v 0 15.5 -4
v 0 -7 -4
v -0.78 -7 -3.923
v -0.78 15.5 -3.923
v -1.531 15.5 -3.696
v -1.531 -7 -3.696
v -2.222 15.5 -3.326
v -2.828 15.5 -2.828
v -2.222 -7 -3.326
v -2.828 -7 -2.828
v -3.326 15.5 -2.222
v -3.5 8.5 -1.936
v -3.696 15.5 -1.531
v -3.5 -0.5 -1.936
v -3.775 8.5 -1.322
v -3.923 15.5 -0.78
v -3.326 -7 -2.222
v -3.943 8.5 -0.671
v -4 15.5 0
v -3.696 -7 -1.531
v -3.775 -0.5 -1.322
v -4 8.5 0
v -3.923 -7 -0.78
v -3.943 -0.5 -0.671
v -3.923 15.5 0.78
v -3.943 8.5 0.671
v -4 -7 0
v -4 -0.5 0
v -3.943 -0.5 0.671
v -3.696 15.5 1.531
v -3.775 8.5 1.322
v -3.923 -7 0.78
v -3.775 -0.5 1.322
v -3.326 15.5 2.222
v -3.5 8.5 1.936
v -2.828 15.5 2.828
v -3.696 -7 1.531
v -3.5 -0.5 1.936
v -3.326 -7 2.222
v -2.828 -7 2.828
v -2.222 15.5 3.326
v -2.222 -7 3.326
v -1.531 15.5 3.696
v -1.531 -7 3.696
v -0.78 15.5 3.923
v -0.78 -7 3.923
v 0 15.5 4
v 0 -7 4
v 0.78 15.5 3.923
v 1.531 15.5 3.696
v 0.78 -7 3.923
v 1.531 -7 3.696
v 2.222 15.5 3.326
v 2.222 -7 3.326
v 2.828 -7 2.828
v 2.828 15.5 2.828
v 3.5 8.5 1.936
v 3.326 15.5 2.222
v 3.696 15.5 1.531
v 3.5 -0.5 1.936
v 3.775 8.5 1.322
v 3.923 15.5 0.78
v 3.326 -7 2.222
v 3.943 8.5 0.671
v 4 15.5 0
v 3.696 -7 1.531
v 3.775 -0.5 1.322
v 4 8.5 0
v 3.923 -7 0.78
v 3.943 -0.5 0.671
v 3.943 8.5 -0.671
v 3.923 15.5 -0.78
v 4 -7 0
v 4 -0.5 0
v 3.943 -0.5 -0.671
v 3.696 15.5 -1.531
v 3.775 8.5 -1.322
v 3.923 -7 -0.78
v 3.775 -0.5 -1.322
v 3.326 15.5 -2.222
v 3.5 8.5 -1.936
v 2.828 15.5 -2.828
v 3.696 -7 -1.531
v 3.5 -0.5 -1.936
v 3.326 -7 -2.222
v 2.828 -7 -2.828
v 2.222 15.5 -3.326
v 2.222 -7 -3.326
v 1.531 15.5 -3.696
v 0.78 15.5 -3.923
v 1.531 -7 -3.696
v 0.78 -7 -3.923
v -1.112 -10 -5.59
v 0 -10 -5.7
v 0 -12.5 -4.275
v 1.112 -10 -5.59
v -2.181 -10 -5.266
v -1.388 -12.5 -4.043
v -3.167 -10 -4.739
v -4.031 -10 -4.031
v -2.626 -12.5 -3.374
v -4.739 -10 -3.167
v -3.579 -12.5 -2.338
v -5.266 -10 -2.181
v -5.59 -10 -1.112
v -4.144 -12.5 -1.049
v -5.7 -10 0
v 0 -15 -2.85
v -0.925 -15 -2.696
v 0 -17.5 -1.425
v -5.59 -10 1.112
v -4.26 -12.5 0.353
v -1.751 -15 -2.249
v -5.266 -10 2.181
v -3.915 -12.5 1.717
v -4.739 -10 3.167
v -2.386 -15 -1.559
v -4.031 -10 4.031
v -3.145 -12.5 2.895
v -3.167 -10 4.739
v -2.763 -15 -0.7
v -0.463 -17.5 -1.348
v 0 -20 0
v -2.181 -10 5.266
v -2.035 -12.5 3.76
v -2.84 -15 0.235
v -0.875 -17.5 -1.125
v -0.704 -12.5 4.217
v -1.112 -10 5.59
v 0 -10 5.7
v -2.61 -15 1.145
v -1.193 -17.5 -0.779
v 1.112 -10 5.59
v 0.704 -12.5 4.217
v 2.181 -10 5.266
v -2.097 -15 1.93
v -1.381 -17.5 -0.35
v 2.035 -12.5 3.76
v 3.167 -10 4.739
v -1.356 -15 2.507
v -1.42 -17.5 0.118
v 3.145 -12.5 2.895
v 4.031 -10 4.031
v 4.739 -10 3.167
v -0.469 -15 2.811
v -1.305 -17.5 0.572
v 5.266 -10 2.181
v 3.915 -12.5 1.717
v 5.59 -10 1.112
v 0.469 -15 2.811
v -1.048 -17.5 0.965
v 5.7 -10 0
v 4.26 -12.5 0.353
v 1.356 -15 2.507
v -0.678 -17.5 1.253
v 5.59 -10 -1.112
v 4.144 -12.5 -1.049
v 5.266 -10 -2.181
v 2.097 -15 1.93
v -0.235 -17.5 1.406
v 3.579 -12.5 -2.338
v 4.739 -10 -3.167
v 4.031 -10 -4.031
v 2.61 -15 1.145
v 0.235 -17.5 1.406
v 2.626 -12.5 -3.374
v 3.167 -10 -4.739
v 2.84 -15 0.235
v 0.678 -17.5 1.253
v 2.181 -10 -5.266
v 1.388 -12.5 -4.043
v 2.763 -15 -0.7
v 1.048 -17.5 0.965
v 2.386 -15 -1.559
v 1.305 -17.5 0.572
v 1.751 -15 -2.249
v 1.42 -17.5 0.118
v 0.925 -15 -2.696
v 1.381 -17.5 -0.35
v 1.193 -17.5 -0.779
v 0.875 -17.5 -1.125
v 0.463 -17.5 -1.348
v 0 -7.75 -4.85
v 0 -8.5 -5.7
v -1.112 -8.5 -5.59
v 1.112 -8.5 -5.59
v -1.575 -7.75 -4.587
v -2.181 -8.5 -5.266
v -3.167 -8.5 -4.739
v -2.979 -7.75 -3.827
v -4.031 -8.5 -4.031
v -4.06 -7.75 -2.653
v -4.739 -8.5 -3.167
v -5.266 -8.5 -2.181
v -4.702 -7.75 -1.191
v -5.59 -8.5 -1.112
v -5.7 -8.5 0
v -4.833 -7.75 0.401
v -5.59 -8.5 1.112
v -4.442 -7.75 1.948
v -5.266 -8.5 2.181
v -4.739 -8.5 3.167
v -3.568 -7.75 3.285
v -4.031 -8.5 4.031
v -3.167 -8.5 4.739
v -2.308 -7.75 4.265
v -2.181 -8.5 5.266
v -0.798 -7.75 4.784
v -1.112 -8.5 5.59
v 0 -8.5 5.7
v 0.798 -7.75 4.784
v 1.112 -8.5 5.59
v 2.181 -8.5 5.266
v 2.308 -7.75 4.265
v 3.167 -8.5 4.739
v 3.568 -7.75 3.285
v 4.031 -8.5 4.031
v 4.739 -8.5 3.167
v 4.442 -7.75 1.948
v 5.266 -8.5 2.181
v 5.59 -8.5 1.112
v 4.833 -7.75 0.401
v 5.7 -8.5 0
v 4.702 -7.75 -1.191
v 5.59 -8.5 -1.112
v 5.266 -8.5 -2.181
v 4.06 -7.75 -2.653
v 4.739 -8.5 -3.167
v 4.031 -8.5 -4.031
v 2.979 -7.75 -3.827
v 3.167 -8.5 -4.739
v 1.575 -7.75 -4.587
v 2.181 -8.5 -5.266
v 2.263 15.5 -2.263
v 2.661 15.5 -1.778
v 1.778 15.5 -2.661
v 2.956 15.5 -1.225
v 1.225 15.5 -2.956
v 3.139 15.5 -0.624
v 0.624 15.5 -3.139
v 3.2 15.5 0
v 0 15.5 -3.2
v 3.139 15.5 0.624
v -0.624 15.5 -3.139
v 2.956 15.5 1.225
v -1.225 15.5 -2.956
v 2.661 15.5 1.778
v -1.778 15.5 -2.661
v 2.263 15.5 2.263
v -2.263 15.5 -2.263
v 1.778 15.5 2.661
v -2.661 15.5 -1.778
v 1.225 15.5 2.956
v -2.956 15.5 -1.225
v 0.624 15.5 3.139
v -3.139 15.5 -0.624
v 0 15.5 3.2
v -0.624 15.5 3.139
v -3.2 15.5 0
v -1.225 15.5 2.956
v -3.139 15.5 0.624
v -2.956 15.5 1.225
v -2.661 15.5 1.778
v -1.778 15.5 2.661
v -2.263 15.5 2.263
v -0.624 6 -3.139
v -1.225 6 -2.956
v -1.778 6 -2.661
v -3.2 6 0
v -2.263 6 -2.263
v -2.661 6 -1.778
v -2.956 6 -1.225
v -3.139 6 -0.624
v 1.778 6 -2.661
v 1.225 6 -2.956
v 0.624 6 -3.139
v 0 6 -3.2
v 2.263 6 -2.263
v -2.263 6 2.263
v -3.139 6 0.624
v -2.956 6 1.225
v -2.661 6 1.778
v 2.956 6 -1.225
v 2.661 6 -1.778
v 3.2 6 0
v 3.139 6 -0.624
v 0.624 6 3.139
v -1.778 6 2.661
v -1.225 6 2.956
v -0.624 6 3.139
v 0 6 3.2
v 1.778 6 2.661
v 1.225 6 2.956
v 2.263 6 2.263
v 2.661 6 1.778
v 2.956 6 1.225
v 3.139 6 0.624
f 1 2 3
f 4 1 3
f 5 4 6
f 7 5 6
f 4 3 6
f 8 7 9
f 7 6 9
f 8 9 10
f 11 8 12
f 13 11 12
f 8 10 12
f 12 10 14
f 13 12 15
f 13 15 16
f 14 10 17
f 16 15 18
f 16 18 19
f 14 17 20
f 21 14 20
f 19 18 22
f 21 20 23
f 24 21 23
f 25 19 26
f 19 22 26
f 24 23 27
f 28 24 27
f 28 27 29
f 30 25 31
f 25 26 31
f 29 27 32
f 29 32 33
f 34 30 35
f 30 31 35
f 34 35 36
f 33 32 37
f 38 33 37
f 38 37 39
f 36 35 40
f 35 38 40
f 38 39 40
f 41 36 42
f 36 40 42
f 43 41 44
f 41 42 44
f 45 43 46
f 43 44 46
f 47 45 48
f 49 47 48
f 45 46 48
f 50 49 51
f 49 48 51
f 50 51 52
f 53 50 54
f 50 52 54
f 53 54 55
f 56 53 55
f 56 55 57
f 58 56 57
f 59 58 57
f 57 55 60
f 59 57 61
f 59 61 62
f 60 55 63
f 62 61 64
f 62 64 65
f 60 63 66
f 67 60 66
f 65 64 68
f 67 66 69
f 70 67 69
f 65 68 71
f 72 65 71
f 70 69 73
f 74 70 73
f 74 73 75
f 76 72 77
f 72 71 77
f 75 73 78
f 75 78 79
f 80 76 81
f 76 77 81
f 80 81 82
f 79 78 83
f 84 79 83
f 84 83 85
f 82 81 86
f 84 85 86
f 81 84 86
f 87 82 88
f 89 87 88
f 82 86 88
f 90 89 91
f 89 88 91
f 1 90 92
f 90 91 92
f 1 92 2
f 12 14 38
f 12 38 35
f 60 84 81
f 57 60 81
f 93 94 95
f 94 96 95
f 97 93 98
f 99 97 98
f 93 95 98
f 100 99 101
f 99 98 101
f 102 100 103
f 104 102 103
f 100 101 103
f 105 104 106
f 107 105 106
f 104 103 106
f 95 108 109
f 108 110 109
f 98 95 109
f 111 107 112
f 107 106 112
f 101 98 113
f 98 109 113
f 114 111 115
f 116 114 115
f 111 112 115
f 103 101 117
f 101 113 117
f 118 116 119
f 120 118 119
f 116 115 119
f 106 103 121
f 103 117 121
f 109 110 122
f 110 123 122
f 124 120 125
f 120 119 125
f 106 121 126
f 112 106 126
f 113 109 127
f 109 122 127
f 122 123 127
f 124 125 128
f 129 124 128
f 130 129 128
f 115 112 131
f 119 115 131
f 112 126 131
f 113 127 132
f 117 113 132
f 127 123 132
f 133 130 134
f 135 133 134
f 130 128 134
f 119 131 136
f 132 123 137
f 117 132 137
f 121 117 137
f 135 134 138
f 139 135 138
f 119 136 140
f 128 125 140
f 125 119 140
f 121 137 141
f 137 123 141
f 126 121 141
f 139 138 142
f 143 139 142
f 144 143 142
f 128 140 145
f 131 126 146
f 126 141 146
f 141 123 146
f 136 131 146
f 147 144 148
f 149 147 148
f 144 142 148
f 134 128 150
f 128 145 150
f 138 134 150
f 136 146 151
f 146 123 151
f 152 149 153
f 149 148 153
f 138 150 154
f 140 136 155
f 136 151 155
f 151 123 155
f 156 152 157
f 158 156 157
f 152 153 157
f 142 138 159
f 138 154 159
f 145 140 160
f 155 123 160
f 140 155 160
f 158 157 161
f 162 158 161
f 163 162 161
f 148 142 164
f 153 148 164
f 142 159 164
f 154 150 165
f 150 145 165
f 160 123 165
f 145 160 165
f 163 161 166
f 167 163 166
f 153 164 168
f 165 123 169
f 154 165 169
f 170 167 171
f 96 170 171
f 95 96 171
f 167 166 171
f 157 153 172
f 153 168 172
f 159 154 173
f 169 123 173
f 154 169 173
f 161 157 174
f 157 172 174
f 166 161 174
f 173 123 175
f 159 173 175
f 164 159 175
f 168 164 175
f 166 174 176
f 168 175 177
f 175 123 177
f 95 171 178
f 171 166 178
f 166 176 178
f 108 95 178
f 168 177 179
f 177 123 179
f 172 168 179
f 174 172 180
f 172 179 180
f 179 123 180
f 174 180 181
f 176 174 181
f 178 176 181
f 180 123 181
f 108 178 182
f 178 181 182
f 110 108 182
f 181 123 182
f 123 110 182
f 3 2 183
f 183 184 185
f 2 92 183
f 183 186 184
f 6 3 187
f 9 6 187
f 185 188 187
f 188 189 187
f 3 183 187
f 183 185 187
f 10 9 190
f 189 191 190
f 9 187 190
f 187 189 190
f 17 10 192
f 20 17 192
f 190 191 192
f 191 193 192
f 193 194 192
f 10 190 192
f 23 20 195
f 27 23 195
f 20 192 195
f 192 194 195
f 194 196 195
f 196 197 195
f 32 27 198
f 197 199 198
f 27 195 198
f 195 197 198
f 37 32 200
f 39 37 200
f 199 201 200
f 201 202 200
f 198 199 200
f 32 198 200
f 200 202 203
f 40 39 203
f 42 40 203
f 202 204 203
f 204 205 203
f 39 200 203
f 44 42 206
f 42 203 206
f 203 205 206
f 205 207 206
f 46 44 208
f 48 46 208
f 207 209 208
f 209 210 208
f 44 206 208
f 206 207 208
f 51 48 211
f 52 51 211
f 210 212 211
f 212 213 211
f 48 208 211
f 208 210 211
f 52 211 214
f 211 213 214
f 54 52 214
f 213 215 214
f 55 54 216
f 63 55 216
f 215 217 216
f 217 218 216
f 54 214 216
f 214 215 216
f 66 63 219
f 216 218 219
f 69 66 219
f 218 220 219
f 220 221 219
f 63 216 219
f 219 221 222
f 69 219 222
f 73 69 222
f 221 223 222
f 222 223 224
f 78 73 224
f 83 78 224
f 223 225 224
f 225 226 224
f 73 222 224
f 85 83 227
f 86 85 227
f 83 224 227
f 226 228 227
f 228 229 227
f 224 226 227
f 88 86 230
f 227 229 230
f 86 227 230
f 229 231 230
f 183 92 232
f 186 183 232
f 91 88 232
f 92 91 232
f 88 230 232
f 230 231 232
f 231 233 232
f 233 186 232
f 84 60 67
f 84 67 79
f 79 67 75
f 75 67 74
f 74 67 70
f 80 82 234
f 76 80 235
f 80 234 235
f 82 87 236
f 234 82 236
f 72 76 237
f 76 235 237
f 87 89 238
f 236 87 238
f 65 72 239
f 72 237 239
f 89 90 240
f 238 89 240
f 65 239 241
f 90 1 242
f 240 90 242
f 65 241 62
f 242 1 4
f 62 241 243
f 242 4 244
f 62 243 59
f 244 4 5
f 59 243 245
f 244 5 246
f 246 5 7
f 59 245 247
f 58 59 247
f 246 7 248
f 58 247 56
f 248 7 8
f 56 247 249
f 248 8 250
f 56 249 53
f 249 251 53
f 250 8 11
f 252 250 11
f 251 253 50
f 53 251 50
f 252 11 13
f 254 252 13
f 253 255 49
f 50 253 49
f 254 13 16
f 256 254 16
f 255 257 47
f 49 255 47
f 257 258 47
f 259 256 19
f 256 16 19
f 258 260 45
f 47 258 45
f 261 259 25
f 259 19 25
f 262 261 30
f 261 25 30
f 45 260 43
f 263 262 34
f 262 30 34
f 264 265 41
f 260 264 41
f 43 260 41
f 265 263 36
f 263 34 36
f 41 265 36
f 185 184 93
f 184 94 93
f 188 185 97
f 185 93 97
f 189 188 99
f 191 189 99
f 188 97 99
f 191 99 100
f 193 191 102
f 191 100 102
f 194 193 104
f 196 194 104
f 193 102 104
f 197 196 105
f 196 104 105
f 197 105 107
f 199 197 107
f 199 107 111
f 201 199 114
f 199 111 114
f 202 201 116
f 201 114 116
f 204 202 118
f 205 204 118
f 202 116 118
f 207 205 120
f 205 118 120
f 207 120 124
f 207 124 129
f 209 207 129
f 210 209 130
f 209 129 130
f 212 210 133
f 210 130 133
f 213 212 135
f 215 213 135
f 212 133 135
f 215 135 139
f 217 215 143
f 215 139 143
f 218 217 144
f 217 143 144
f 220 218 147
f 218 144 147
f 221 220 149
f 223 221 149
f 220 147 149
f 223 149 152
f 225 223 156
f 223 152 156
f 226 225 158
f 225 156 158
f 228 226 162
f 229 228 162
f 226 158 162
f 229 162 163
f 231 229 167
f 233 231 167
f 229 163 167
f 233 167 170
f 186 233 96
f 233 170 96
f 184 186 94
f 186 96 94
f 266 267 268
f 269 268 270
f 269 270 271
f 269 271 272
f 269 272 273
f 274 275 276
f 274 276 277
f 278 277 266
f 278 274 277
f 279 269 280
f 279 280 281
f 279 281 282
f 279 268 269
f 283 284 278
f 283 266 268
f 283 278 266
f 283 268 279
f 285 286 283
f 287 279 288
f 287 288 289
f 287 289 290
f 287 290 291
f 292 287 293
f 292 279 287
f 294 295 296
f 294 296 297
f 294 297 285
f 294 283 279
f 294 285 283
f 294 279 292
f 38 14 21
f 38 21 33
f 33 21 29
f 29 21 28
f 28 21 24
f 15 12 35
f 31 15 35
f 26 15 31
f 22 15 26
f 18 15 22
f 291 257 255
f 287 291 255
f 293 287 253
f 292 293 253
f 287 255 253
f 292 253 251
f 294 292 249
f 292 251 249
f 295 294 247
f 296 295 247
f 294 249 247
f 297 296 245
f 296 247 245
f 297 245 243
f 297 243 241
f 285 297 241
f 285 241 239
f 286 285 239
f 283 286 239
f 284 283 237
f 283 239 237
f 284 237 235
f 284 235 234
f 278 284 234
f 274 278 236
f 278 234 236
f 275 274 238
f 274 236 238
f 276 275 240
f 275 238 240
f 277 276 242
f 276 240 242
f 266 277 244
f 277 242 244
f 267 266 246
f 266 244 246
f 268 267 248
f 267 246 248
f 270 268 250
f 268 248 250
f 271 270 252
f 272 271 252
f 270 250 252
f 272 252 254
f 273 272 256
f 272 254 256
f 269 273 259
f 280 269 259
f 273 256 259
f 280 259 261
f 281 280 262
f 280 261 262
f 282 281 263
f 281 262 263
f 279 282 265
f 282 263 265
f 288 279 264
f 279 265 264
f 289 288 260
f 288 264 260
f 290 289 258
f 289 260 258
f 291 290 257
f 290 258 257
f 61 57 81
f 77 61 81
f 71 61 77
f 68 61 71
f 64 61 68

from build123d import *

# Parameters (mm, degrees)
SKETCH2_R               = 3.2
CUT_EXTRUDE1_DEPTH      = 9.5
CUT_EXTRUDE2_DEPTH      = 9.5
CUT_EXTRUDE2_DEPTH_BACK = 9.5
SKETCH3_W               = 4
SKETCH3_H               = 9


with BuildPart() as part:
    # Sketch1 → Revolve1 (revolve)
    with BuildSketch(Plane.XY):
        Polygon((0, -7.607142857), (0, 15.5), (-4, 15.5), (-4, -7), (-5.7, -8.5), (-5.7, -10), (0, -20), align=None)
    revolve(axis=Axis((0, -7.607142857, 0), (0, 1, 0)))

    # Sketch2 → Cut-Extrude1 (cut)
    with BuildSketch(Plane(origin=(0, 15.5, 0), x_dir=(1, 0, 0), z_dir=(0, 1, 0))):
        Circle(SKETCH2_R)
    extrude(amount=-CUT_EXTRUDE1_DEPTH, mode=Mode.SUBTRACT)

    # Sketch3 → Cut-Extrude2 (cut, two sides: drawn at the far end of the back side and taken through both)
    with BuildSketch(Plane.XY.offset(-CUT_EXTRUDE2_DEPTH_BACK)):
        with Locations((-5.5, 4)):
            Rectangle(SKETCH3_W, SKETCH3_H)
        with Locations((5.5, 4)):
            Rectangle(SKETCH3_W, SKETCH3_H)
    extrude(amount=CUT_EXTRUDE2_DEPTH + CUT_EXTRUDE2_DEPTH_BACK, mode=Mode.SUBTRACT)


solid = part.part
